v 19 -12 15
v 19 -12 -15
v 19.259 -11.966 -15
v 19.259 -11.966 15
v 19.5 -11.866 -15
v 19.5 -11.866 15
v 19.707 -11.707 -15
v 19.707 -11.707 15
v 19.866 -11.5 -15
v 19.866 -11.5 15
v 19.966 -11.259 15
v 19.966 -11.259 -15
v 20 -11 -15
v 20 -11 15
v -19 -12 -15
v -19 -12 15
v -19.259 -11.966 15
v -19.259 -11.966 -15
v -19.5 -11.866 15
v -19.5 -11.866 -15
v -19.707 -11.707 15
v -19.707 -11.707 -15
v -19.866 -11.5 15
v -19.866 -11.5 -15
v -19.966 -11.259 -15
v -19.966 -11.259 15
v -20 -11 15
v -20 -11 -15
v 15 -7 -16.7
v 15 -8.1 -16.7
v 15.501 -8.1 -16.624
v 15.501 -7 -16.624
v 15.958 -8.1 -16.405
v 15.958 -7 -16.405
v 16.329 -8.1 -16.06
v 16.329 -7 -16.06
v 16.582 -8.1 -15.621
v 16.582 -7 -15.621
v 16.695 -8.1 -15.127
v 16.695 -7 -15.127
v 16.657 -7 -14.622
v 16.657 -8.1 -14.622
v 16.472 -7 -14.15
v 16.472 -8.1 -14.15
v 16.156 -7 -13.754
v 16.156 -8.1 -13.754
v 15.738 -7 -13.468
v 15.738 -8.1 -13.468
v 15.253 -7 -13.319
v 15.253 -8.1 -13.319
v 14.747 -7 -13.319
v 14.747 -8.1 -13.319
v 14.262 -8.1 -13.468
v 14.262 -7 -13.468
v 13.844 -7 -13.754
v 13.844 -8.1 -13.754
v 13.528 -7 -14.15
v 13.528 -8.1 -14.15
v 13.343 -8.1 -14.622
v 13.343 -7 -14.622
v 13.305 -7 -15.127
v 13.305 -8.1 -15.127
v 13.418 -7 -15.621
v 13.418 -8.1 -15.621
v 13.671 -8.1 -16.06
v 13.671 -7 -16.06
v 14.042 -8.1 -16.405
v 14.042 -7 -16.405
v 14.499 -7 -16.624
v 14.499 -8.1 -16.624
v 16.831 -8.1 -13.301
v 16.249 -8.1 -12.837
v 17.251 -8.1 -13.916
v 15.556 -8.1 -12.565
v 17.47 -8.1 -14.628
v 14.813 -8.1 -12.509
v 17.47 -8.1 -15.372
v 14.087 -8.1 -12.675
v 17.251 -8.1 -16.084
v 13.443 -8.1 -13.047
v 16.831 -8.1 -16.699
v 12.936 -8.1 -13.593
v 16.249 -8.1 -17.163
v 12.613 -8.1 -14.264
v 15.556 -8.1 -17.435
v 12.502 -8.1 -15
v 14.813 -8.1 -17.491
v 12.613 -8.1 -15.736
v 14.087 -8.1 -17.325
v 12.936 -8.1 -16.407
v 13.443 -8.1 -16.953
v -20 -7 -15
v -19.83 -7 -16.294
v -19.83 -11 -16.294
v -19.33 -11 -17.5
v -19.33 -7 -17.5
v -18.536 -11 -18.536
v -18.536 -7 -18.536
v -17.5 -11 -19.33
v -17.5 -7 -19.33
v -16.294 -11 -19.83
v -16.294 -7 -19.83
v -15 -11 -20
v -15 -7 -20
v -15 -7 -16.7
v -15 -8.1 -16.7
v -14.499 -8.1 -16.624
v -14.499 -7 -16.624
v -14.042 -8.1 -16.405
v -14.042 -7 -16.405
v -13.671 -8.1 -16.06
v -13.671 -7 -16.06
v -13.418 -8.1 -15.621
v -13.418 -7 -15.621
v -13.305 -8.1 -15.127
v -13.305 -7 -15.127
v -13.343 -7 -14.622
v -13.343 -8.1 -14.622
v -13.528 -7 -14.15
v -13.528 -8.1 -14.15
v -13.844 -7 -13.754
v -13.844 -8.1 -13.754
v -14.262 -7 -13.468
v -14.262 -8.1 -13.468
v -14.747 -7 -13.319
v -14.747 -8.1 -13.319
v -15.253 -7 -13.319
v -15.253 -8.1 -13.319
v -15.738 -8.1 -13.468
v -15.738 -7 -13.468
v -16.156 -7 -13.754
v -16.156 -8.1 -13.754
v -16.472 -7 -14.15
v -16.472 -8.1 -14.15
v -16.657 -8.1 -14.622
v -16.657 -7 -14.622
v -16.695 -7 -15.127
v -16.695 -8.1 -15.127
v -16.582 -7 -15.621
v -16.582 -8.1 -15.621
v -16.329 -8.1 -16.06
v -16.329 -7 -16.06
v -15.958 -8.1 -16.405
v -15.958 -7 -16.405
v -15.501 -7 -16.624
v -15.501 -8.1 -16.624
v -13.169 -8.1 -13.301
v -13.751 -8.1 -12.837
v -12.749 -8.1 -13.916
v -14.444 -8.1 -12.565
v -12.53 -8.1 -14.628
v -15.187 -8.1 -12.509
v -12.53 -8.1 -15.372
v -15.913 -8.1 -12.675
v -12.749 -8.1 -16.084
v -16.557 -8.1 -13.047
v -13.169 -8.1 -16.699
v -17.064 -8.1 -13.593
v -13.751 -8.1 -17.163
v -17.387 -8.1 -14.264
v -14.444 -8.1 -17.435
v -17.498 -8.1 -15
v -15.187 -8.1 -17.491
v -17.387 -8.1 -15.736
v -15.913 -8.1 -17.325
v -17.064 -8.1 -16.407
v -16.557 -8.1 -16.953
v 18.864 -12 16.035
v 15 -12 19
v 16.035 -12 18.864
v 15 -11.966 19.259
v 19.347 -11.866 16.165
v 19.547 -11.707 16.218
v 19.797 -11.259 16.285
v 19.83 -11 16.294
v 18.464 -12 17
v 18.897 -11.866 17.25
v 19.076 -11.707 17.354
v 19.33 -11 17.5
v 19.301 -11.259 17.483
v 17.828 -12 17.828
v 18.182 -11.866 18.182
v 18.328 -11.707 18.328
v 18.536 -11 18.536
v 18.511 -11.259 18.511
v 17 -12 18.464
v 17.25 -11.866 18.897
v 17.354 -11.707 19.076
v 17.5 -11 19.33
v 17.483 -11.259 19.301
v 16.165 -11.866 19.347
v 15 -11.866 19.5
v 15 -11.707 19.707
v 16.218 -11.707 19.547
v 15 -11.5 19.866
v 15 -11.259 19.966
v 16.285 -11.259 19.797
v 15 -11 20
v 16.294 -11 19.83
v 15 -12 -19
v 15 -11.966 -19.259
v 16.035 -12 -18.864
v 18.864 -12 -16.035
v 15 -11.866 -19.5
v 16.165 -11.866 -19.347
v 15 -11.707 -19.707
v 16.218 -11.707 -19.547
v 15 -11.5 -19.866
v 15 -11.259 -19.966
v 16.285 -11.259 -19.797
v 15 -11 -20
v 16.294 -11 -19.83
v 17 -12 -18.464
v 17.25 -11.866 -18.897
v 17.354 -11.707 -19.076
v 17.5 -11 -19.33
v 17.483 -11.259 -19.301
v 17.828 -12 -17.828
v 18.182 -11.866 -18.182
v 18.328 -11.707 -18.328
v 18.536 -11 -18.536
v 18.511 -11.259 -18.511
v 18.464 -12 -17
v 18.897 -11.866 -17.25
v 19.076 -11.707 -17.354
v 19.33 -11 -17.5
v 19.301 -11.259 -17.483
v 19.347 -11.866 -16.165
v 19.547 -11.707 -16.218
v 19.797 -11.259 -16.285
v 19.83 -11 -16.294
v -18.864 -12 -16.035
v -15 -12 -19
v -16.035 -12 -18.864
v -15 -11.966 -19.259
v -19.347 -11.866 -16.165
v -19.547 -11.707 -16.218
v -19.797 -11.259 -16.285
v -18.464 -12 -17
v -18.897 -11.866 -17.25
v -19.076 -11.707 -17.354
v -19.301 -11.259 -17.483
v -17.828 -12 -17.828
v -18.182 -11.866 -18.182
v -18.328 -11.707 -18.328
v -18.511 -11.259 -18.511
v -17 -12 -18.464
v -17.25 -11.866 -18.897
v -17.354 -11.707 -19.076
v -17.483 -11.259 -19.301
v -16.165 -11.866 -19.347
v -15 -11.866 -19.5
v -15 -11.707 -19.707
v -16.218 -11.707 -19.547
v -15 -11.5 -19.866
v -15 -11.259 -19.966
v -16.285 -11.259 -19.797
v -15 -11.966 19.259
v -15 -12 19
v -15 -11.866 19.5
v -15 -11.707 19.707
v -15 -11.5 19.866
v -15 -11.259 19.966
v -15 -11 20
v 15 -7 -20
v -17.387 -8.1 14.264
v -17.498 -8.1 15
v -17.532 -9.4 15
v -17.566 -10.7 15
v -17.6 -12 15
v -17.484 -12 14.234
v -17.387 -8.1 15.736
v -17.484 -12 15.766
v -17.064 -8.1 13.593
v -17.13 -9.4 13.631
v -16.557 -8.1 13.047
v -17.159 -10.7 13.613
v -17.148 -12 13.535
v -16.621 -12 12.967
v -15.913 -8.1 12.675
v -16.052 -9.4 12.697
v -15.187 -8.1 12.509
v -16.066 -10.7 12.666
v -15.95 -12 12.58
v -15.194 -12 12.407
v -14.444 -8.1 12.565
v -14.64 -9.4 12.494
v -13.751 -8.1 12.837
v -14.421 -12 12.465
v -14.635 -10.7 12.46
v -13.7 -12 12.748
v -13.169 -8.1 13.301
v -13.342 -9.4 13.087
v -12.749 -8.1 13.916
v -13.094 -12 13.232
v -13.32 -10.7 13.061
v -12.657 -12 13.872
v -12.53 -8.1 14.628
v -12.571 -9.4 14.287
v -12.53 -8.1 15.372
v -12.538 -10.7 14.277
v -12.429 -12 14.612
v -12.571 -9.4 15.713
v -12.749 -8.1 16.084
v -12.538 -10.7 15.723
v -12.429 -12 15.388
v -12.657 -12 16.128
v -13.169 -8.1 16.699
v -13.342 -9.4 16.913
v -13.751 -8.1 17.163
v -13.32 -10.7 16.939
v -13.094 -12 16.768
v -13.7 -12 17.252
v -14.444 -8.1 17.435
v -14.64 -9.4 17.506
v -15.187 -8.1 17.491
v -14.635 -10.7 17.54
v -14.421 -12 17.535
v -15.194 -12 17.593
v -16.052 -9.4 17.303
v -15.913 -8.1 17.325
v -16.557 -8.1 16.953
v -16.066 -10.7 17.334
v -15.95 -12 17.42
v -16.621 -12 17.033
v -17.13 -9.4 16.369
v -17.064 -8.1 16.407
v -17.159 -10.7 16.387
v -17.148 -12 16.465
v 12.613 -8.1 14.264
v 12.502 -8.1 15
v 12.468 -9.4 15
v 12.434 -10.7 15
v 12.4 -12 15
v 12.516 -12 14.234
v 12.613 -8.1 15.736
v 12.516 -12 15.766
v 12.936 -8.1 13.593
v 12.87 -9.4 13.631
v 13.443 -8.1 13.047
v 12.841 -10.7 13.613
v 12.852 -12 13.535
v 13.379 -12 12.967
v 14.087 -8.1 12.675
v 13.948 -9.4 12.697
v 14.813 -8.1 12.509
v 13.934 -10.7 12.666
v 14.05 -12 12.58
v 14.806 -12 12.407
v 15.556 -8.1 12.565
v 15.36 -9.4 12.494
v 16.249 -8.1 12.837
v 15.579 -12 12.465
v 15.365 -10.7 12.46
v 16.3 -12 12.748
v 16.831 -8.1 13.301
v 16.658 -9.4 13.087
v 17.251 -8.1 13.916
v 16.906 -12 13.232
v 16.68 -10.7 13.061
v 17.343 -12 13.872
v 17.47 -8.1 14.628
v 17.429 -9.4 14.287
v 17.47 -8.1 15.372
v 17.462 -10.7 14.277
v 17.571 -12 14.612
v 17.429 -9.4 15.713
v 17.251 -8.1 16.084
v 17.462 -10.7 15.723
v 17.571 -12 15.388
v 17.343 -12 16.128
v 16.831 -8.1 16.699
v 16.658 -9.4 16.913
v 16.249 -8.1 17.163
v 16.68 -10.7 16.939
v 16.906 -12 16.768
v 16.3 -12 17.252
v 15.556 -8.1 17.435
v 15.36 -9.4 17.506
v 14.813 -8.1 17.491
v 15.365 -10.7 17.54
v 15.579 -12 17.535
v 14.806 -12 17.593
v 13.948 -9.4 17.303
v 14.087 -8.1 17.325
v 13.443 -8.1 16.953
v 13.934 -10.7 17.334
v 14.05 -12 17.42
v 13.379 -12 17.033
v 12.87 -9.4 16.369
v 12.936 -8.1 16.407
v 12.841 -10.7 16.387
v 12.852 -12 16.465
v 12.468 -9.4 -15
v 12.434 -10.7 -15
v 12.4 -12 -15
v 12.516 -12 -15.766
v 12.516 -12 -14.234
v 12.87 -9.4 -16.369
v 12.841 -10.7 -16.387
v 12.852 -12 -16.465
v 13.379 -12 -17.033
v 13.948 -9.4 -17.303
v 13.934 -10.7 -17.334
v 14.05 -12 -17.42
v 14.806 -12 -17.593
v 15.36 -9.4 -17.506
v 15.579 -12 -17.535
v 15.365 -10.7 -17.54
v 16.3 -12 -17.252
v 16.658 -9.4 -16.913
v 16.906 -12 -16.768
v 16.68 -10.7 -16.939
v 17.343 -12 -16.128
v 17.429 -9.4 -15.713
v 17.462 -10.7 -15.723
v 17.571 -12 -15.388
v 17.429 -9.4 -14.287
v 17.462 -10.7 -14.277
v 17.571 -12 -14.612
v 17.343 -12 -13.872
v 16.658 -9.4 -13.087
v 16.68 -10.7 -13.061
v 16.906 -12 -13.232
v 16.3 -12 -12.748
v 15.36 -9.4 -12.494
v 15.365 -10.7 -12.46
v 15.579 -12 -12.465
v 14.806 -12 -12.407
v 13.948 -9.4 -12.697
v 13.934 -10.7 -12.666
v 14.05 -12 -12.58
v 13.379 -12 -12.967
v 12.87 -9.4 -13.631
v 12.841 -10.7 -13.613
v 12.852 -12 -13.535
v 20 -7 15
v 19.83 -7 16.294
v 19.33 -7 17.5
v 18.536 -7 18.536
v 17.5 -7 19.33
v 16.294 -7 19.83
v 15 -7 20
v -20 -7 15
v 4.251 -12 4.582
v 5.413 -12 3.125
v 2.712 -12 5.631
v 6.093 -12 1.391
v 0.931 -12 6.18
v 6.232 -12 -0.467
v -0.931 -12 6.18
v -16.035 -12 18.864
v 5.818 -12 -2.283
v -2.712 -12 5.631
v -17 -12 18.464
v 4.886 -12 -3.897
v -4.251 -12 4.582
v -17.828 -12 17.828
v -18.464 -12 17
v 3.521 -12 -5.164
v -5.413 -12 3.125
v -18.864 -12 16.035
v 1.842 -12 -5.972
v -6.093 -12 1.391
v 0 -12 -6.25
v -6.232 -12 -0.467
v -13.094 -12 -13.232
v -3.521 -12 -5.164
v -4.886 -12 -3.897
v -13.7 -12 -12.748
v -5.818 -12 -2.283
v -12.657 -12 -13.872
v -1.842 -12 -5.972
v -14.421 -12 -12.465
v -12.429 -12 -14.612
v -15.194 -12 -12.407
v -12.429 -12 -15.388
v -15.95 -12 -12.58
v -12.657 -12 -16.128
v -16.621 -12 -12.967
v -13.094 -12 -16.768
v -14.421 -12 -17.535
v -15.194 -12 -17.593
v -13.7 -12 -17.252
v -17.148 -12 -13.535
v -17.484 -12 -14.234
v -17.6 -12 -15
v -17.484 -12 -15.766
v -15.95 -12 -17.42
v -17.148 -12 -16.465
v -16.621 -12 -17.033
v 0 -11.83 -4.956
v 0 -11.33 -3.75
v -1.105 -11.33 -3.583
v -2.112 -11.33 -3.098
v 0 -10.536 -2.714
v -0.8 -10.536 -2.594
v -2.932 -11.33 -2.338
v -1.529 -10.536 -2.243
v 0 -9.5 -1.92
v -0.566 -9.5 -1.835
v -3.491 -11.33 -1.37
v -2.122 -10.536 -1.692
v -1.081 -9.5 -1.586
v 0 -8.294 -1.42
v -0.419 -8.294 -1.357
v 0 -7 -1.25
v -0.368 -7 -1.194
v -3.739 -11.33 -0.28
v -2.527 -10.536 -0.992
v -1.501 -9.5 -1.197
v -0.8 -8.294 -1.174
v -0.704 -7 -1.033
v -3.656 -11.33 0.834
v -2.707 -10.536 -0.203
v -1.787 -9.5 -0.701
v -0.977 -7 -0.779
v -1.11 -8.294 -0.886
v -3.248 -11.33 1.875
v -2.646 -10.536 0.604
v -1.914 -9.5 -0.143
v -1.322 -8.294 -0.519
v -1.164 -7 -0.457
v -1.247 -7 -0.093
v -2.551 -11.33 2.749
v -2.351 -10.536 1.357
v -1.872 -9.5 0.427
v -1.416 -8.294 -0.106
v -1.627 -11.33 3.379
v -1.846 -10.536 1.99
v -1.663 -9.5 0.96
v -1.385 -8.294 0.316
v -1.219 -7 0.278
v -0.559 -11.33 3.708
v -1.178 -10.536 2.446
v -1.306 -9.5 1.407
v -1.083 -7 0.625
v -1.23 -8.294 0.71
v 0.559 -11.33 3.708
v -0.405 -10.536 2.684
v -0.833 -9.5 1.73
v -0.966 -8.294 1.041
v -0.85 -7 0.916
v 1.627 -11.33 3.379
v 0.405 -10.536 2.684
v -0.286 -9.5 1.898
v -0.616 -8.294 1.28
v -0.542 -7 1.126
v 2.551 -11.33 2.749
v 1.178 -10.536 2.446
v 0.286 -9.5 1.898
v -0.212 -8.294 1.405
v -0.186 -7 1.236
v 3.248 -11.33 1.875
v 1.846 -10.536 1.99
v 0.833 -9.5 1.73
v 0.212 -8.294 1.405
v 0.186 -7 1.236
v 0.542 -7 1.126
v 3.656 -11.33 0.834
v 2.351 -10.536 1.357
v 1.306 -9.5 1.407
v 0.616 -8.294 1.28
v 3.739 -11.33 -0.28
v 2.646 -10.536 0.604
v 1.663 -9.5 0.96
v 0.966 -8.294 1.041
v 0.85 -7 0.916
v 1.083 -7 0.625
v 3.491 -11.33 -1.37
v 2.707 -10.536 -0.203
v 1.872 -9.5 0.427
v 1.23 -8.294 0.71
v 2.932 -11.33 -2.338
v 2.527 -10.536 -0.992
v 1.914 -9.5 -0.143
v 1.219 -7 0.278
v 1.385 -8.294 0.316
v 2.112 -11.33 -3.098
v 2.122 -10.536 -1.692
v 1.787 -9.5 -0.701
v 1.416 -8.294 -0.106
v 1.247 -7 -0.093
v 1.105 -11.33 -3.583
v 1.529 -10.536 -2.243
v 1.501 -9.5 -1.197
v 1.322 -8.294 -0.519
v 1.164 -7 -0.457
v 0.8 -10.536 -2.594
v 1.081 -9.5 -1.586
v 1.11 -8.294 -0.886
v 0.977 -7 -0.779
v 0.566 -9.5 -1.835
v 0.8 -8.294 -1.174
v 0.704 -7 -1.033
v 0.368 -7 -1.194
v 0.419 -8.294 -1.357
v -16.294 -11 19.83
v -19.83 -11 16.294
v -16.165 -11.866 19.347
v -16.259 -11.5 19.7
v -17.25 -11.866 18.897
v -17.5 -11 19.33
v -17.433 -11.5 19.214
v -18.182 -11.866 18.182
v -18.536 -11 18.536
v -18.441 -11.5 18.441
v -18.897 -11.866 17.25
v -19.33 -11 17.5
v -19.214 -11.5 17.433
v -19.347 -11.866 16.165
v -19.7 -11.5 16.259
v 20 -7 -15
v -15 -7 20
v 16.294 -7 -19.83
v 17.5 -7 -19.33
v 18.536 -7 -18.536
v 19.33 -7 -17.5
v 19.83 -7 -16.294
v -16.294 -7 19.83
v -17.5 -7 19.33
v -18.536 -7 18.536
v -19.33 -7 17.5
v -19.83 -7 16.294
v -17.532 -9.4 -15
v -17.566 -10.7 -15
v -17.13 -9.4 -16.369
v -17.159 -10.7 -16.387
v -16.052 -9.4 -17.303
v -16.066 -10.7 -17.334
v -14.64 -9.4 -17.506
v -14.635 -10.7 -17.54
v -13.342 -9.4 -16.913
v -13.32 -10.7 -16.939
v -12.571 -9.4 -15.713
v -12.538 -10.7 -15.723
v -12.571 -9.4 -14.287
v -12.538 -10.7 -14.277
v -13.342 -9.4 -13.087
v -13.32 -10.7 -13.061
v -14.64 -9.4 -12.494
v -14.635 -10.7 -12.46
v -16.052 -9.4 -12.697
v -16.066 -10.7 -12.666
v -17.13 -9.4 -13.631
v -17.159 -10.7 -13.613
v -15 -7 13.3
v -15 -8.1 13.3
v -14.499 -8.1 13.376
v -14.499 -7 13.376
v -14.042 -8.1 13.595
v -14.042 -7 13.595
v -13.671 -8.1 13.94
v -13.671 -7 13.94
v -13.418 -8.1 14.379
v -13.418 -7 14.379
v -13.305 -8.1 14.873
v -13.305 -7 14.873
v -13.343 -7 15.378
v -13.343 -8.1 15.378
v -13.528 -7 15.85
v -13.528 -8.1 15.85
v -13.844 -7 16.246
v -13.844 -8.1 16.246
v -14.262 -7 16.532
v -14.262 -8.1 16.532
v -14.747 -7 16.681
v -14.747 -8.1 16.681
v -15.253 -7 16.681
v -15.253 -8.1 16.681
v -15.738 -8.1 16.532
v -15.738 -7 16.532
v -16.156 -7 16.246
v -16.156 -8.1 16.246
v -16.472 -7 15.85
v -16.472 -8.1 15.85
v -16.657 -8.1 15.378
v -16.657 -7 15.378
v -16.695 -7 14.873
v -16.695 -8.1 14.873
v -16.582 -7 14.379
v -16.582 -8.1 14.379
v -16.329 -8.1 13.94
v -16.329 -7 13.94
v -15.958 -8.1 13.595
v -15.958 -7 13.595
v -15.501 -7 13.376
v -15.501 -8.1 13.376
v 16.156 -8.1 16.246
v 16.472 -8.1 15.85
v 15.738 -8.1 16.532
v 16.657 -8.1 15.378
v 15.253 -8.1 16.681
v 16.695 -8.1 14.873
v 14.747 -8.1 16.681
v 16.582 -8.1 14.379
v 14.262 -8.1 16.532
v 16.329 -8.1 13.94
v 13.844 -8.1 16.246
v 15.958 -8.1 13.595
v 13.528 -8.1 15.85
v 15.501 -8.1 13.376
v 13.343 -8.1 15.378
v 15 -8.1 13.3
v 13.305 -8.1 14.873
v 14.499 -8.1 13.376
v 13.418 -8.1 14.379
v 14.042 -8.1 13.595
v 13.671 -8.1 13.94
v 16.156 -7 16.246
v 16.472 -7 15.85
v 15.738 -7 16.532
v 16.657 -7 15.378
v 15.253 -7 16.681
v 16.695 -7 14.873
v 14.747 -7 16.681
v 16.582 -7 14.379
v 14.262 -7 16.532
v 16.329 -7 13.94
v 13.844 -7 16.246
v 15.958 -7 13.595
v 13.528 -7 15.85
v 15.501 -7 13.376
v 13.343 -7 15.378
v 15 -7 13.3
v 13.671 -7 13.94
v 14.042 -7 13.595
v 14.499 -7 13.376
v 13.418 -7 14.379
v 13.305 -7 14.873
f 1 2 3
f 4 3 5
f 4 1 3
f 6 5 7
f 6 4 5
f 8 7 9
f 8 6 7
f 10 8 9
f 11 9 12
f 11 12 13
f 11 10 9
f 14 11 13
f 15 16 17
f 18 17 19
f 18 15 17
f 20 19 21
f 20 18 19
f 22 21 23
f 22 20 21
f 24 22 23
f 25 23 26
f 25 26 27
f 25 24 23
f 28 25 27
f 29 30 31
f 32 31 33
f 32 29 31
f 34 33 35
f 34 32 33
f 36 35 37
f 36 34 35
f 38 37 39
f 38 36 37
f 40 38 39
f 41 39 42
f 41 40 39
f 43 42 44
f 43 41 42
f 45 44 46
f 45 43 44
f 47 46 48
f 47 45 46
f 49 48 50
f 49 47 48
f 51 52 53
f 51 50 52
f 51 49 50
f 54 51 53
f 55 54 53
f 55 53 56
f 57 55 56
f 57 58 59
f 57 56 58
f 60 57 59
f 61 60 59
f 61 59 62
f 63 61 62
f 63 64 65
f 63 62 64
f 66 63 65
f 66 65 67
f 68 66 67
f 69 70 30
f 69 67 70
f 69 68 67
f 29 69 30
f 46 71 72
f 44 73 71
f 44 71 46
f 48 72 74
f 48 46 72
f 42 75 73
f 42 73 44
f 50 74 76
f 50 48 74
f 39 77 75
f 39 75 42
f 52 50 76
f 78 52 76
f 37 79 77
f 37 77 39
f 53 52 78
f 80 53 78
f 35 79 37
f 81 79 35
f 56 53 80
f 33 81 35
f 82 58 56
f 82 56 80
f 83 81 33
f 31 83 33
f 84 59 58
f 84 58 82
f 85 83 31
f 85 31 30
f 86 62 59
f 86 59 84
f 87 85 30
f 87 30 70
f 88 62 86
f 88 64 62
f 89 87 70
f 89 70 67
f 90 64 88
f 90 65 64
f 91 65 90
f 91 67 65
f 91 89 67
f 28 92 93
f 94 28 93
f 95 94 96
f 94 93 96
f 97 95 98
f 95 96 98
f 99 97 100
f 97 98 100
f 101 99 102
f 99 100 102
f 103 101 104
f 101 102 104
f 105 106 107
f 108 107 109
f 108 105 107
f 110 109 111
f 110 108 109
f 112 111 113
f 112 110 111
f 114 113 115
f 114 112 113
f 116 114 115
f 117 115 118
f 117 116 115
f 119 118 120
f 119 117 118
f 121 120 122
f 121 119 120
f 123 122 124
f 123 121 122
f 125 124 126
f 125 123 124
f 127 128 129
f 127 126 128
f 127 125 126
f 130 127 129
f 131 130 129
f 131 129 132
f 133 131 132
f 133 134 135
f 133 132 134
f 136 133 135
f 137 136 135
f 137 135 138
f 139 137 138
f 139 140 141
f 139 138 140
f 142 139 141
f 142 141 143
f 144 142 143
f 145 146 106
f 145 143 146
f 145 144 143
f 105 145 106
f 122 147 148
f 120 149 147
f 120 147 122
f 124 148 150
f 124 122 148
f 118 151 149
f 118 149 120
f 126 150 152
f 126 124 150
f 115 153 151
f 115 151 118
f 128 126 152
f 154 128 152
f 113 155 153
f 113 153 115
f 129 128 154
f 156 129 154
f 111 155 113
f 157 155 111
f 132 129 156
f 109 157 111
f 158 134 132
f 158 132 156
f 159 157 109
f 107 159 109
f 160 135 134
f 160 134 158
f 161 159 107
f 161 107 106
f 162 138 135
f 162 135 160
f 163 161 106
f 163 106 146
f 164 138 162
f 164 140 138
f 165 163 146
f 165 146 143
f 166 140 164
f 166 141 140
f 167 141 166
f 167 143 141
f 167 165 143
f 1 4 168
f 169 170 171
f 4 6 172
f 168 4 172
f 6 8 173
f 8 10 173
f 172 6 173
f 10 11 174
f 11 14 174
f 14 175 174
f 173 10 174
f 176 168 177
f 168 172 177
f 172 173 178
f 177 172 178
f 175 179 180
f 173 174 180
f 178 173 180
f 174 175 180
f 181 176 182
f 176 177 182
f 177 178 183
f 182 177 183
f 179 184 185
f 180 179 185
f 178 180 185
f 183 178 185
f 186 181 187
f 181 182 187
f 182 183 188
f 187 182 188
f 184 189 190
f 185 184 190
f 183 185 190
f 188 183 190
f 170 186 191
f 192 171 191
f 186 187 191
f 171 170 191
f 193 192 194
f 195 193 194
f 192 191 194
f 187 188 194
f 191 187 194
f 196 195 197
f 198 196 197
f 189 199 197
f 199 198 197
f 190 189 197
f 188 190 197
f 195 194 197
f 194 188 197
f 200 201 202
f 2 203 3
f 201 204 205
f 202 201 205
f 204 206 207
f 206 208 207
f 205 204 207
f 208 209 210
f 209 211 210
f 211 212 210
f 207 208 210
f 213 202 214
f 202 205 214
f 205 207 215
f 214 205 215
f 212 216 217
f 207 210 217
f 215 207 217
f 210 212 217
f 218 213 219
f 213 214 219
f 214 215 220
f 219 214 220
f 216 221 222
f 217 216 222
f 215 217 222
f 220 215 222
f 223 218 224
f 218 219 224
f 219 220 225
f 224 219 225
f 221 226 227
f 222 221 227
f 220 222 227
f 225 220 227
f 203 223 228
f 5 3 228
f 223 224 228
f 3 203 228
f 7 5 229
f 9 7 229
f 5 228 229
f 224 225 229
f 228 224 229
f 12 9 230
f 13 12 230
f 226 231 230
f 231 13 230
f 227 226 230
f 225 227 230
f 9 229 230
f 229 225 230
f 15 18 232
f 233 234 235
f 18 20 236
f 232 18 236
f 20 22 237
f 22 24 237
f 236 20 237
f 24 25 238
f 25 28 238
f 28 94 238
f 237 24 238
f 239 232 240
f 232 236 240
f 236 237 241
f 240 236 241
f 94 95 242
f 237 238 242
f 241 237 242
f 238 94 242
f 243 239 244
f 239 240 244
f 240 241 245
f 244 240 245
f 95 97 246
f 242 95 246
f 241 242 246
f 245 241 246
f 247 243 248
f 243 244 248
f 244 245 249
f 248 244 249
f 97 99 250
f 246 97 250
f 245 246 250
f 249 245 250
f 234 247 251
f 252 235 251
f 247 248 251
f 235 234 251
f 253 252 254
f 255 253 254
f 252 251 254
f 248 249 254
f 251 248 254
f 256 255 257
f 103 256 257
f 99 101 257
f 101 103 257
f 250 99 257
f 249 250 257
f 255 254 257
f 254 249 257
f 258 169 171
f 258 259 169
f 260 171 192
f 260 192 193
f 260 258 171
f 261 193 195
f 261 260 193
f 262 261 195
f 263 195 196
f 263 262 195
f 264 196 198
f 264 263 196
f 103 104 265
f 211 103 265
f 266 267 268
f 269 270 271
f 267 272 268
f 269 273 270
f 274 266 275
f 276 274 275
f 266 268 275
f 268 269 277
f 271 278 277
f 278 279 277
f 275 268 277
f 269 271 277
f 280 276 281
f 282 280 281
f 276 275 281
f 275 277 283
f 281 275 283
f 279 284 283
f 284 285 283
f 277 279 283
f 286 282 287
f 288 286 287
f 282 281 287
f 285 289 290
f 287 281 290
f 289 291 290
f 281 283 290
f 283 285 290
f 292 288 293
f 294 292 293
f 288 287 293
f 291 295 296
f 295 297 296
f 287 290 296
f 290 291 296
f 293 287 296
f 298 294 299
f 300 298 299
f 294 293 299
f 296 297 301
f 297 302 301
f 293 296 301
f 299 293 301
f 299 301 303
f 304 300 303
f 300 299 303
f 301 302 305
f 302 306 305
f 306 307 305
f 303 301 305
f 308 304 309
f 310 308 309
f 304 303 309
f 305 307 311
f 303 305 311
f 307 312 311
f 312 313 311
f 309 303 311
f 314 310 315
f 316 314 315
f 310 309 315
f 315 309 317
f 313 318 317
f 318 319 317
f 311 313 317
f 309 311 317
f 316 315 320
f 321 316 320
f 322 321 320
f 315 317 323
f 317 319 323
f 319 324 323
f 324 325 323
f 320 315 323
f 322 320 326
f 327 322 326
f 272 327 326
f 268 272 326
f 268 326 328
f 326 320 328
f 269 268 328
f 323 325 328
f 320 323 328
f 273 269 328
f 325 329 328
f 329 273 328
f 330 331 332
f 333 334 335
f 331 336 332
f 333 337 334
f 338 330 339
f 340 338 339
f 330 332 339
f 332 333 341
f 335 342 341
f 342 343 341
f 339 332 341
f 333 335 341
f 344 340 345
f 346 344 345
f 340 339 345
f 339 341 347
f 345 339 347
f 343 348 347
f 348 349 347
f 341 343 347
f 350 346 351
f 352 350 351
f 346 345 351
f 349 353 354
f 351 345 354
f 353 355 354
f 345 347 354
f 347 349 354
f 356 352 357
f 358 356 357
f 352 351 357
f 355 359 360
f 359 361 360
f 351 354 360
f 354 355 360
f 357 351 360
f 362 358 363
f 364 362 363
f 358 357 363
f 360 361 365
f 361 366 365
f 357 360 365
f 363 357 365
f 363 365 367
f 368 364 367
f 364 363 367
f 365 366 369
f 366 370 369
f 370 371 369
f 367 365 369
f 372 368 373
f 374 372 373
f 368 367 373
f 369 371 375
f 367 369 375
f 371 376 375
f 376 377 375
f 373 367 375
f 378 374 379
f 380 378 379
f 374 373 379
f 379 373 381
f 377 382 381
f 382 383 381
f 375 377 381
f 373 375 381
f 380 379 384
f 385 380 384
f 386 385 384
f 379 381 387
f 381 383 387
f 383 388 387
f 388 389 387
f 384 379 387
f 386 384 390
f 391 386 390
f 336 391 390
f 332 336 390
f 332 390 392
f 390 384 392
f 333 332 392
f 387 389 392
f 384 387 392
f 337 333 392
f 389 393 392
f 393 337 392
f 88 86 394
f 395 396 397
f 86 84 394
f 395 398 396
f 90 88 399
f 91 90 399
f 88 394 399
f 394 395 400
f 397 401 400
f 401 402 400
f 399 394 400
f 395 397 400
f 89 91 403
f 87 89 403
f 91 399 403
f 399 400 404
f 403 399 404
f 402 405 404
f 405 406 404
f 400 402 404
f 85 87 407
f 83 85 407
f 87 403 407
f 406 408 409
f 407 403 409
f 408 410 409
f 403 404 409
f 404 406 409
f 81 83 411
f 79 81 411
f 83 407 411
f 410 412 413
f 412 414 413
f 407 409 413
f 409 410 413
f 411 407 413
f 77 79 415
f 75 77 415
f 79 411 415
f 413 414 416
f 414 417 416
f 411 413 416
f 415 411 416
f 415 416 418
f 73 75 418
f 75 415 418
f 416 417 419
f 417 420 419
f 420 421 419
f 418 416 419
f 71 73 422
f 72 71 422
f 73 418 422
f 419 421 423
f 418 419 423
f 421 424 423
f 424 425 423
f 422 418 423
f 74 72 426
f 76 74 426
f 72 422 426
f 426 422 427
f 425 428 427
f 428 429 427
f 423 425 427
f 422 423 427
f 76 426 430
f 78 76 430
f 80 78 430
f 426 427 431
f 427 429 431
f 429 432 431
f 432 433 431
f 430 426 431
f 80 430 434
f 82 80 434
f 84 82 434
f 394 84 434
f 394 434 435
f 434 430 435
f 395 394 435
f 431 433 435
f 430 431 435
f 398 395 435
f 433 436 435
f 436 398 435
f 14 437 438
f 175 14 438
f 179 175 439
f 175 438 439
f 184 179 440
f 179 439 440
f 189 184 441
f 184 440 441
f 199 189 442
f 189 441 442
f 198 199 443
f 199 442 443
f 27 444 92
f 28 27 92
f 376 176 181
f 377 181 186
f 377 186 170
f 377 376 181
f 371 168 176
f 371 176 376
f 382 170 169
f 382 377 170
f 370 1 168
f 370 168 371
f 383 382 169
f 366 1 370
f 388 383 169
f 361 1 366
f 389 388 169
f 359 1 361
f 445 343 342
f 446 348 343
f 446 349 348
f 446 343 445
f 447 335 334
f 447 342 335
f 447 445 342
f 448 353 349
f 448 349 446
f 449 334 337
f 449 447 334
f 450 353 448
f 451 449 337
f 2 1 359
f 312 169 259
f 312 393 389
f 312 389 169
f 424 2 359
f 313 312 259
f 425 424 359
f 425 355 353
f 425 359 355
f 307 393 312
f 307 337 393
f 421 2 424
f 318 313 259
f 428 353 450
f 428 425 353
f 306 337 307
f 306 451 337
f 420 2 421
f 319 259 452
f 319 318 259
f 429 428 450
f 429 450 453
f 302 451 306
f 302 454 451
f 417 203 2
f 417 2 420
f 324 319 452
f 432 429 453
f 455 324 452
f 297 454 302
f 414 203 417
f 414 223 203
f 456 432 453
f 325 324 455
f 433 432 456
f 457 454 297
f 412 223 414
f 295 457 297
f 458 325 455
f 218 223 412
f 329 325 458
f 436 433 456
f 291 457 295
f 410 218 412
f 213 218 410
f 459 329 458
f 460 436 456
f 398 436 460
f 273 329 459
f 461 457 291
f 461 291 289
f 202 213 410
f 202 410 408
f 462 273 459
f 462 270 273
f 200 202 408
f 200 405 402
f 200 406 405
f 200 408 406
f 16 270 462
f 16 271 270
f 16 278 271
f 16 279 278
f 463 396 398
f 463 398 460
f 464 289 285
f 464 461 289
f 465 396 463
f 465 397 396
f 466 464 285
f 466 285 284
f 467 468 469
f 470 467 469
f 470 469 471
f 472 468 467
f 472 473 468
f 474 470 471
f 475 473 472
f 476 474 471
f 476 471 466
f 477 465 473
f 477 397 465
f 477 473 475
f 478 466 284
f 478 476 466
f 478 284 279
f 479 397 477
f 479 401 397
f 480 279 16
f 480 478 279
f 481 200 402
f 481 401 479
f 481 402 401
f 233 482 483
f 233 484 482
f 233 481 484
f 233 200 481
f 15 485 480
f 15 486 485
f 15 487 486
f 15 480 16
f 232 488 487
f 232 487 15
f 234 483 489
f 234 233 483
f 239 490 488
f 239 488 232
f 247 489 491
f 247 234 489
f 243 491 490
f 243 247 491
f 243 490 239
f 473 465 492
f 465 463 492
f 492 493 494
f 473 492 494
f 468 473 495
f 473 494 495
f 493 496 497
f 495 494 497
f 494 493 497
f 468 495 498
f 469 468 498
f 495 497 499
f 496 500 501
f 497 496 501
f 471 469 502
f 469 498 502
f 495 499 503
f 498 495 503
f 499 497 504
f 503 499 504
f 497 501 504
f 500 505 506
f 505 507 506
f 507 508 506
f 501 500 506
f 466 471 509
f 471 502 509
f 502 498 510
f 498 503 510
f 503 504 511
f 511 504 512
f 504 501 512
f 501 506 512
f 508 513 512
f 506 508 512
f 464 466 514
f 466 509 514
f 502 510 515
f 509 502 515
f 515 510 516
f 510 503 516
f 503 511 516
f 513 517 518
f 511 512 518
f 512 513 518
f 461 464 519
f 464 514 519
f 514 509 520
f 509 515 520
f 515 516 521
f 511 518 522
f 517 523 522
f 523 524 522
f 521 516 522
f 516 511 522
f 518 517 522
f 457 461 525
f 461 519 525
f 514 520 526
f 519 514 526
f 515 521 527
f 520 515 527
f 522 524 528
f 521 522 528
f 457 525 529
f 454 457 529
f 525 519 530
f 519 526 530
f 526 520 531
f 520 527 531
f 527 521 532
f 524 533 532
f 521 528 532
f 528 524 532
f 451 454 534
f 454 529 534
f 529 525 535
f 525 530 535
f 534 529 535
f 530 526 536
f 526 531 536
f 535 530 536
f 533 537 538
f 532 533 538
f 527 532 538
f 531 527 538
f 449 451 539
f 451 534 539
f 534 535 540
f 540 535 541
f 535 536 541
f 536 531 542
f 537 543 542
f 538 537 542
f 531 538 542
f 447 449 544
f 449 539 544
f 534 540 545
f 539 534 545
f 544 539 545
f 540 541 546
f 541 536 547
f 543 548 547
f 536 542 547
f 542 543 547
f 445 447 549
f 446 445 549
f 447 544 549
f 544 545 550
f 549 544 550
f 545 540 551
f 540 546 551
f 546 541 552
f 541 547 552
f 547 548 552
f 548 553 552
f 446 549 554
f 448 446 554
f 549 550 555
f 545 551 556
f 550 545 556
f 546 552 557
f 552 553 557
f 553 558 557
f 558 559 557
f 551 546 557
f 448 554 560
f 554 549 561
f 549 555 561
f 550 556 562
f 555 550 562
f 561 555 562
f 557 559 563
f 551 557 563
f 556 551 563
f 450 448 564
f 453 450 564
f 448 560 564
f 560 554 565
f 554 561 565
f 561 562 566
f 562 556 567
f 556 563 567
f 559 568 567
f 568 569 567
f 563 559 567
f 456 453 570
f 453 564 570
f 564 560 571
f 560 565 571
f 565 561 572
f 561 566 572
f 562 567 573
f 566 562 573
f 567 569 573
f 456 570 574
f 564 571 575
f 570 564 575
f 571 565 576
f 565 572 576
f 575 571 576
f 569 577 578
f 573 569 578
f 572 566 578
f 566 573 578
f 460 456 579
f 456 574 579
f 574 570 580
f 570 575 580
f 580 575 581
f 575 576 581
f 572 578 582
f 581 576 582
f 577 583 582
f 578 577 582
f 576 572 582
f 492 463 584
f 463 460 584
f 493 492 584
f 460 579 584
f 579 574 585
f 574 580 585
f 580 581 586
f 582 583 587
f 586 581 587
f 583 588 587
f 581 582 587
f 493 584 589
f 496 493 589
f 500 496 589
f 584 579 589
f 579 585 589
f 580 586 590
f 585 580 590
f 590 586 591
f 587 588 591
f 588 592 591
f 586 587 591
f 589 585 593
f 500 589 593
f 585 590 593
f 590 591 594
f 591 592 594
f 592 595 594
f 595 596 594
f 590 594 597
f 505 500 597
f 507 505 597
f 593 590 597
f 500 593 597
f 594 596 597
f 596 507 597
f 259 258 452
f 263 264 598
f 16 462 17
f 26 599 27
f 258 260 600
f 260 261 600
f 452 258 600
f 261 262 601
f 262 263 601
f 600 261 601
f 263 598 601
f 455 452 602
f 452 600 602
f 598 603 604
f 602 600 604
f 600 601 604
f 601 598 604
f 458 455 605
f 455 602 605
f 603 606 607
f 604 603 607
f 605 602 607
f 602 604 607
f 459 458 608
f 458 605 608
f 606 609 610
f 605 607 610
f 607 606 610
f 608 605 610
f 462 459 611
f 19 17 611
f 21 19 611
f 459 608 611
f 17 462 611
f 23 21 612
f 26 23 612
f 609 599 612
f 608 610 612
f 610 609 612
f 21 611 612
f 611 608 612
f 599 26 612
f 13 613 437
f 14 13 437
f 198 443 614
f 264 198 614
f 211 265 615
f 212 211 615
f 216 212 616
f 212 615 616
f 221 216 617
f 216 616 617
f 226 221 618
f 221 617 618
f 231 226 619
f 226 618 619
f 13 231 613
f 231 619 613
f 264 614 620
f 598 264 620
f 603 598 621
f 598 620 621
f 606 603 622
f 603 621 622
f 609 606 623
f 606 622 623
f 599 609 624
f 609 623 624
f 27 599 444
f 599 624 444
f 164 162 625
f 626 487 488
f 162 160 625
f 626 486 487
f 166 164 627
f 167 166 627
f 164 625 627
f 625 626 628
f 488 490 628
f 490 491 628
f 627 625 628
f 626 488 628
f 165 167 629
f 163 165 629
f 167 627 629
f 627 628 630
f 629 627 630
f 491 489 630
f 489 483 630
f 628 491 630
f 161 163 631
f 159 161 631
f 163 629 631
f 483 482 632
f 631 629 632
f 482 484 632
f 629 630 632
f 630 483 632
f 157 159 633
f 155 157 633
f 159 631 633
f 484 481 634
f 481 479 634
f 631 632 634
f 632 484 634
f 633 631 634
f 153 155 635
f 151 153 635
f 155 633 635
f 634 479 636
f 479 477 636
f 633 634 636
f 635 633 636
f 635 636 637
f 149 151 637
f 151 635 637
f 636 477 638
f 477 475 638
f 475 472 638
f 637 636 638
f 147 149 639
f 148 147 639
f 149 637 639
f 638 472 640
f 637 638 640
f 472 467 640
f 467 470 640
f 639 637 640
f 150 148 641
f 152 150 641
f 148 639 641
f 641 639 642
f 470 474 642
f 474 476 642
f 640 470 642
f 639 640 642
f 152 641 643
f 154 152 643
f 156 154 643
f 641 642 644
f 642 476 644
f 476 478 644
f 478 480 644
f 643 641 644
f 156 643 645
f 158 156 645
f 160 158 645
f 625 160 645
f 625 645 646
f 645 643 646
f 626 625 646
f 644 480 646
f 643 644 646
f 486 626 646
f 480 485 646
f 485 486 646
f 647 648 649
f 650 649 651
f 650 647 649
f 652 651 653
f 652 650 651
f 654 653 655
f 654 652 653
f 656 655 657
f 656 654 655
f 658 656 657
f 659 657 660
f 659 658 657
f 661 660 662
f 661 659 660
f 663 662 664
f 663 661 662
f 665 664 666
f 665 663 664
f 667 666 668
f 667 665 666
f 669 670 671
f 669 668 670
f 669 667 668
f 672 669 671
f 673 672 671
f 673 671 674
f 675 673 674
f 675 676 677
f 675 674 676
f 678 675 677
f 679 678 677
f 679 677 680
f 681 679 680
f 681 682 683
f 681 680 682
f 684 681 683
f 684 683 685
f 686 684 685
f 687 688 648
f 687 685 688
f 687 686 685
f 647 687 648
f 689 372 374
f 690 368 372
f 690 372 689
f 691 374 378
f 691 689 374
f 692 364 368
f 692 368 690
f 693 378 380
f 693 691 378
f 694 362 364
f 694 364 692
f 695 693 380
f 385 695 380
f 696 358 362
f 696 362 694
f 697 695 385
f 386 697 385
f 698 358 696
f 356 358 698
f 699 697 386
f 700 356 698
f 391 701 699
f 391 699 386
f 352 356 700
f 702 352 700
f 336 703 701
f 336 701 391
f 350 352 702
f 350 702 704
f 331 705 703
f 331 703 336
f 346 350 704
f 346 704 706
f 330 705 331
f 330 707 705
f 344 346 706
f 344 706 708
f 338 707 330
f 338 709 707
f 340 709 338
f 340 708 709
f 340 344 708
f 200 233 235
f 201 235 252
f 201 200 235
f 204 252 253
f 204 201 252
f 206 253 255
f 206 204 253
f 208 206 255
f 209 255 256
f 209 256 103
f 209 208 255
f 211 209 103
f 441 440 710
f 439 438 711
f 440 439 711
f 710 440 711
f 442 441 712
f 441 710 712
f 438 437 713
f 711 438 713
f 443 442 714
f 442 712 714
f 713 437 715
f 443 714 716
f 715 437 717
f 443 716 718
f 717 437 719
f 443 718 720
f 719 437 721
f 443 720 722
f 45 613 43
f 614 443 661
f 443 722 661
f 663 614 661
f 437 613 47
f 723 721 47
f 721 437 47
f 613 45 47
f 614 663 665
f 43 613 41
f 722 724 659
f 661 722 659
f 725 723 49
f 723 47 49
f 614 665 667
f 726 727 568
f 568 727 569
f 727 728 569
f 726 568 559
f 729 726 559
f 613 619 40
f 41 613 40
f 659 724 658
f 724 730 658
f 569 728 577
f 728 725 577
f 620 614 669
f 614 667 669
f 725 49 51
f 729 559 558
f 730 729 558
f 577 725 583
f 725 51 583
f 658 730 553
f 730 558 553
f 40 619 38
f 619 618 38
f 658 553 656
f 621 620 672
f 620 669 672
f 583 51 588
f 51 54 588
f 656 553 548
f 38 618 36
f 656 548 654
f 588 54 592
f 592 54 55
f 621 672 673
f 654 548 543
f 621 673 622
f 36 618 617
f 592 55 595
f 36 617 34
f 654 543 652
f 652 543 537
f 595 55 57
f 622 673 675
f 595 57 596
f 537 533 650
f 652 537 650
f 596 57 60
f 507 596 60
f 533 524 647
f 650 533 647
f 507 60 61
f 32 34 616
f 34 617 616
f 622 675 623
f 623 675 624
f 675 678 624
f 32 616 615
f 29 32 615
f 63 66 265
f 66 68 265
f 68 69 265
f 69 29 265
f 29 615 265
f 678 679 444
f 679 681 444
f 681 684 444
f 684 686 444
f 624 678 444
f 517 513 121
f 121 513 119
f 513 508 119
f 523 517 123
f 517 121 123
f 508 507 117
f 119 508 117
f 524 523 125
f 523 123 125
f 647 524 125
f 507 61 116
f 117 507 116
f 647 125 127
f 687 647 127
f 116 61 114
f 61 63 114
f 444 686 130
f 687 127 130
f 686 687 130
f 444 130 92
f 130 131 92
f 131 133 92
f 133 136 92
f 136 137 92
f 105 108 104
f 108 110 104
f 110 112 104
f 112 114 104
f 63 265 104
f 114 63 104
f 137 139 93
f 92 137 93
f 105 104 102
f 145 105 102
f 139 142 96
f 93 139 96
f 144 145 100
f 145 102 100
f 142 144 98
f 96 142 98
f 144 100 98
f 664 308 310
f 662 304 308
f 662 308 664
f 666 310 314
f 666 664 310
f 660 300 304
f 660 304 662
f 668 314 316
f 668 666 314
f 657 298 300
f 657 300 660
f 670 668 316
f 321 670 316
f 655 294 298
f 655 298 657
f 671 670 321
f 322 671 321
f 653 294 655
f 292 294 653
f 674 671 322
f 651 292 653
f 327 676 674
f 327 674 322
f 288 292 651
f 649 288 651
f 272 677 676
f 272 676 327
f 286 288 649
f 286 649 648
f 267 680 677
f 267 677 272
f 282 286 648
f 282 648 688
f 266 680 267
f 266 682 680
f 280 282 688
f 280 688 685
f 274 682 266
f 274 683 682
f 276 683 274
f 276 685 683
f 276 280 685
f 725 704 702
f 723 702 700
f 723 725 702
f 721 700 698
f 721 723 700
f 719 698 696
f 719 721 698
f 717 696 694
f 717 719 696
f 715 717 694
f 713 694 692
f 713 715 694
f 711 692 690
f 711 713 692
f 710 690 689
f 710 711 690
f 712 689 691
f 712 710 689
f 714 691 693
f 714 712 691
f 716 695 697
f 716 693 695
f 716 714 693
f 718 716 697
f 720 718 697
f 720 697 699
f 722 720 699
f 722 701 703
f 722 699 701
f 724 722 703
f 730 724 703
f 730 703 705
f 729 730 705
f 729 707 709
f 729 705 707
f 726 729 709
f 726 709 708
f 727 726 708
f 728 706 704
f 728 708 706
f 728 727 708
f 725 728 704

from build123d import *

# Parameters (mm, degrees)
BOSS_EXTRUDE1_DEPTH          = 5
SKETCH1_3_R                  = 1.7
SKETCH1_3_R_2                = 1.25
CUT_EXTRUDE3_DEPTH           = 29.722813233
CUT_EXTRUDE4_START           = 5
SKETCH1_4_R                  = 2.6
CUT_EXTRUDE4_DEPTH           = 3.9
CUT_EXTRUDE4_DRAFT           = -1.5
CUT_EXTRUDE4_PROFILE_2_DEPTH = 3.9
CUT_EXTRUDE4_PROFILE_2_DRAFT = -1.5
CUT_EXTRUDE4_PROFILE_3_DEPTH = 3.9
CUT_EXTRUDE4_PROFILE_3_DRAFT = -1.5
CUT_EXTRUDE4_PROFILE_4_DEPTH = 3.9
CUT_EXTRUDE4_PROFILE_4_DRAFT = -1.5
FILLET1_R                    = 5
FILLET2_R                    = 1


with BuildPart() as part:
    # Sketch1 → Boss-Extrude1 (new body)
    with BuildSketch(Plane(origin=(0, -7, 0), x_dir=(-1, 0, 0), z_dir=(0, -1, 0))):
        with BuildLine():
            Line((15, 20), (-15, 20))
            ThreePointArc((-15, 20), (-18.535533906, 18.535533906), (-20, 15))
            Line((-20, 15), (-20, -15))
            ThreePointArc((-20, -15), (-18.535533906, -18.535533906), (-15, -20))
            Line((-15, -20), (15, -20))
            ThreePointArc((15, -20), (18.535533906, -18.535533906), (20, -15))
            Line((20, -15), (20, 15))
            ThreePointArc((20, 15), (18.535533906, 18.535533906), (15, 20))
        make_face()
    extrude(amount=BOSS_EXTRUDE1_DEPTH)

    # Sketch1<3> → Cut-Extrude3 (cut, through all)
    with BuildSketch(Plane(origin=(0, -7, 0), x_dir=(-1, 0, 0), z_dir=(0, -1, 0))):
        with Locations(Location((-15, 15, 0), (0, 0, 90))):
            Circle(SKETCH1_3_R)
        with Locations(Location((15, 15, 0), (0, 0, 90))):
            Circle(SKETCH1_3_R)
        with Locations(Location((-15, -15, 0), (0, 0, 90))):
            Circle(SKETCH1_3_R)
        with Locations(Location((15, -15, 0), (0, 0, 90))):
            Circle(SKETCH1_3_R)
        with Locations(Location((0, 0, 0), (0, 0, 90))):
            Circle(SKETCH1_3_R_2)
    extrude(amount=CUT_EXTRUDE3_DEPTH, mode=Mode.SUBTRACT)


with BuildPart() as cut_extrude4_tool:
    # Sketch1<4> → Cut-Extrude4 (with draft: the straight prism first)
    with BuildSketch(Plane(origin=(0, -7, 0), x_dir=(-1, 0, 0), z_dir=(0, -1, 0)).offset(CUT_EXTRUDE4_START)):
        with Locations((15, -15)):
            Circle(SKETCH1_4_R)
    extrude(amount=-CUT_EXTRUDE4_DEPTH)
    # Cut-Extrude4: the draft: its side faces are tilted about the plane it starts from
    cut_extrude4_sides = [cut_extrude4_tool.faces().sort_by_distance(p)[0] for p in [
        (-12.4, -10.05, 15),
    ]]
    draft(cut_extrude4_sides, Plane(origin=(0, -7, 0), x_dir=(-1, 0, 0), z_dir=(0, -1, 0)).offset(CUT_EXTRUDE4_START), CUT_EXTRUDE4_DRAFT)


with BuildPart() as part_1:
    add(part.part)

    # Cut-Extrude4: cut by cut_extrude4_tool
    add(cut_extrude4_tool.part, mode=Mode.SUBTRACT)


with BuildPart() as cut_extrude4_profile_2_tool:
    # Sketch1<4> → Cut-Extrude4 profile 2 (with draft: the straight prism first)
    with BuildSketch(Plane(origin=(0, -7, 0), x_dir=(-1, 0, 0), z_dir=(0, -1, 0)).offset(CUT_EXTRUDE4_START)):
        with Locations((-15, -15)):
            Circle(SKETCH1_4_R)
    extrude(amount=-CUT_EXTRUDE4_PROFILE_2_DEPTH)
    # Cut-Extrude4 profile 2: the draft: its side faces are tilted about the plane it starts from
    cut_extrude4_profile_2_sides = [cut_extrude4_profile_2_tool.faces().sort_by_distance(p)[0] for p in [
        (17.6, -10.05, 15),
    ]]
    draft(cut_extrude4_profile_2_sides, Plane(origin=(0, -7, 0), x_dir=(-1, 0, 0), z_dir=(0, -1, 0)).offset(CUT_EXTRUDE4_START), CUT_EXTRUDE4_PROFILE_2_DRAFT)


with BuildPart() as part_2:
    add(part_1.part)

    # Cut-Extrude4 profile 2: cut by cut_extrude4_profile_2_tool
    add(cut_extrude4_profile_2_tool.part, mode=Mode.SUBTRACT)


with BuildPart() as cut_extrude4_profile_3_tool:
    # Sketch1<4> → Cut-Extrude4 profile 3 (with draft: the straight prism first)
    with BuildSketch(Plane(origin=(0, -7, 0), x_dir=(-1, 0, 0), z_dir=(0, -1, 0)).offset(CUT_EXTRUDE4_START)):
        with Locations((-15, 15)):
            Circle(SKETCH1_4_R)
    extrude(amount=-CUT_EXTRUDE4_PROFILE_3_DEPTH)
    # Cut-Extrude4 profile 3: the draft: its side faces are tilted about the plane it starts from
    cut_extrude4_profile_3_sides = [cut_extrude4_profile_3_tool.faces().sort_by_distance(p)[0] for p in [
        (17.6, -10.05, -15),
    ]]
    draft(cut_extrude4_profile_3_sides, Plane(origin=(0, -7, 0), x_dir=(-1, 0, 0), z_dir=(0, -1, 0)).offset(CUT_EXTRUDE4_START), CUT_EXTRUDE4_PROFILE_3_DRAFT)


with BuildPart() as part_3:
    add(part_2.part)

    # Cut-Extrude4 profile 3: cut by cut_extrude4_profile_3_tool
    add(cut_extrude4_profile_3_tool.part, mode=Mode.SUBTRACT)


with BuildPart() as cut_extrude4_profile_4_tool:
    # Sketch1<4> → Cut-Extrude4 profile 4 (with draft: the straight prism first)
    with BuildSketch(Plane(origin=(0, -7, 0), x_dir=(-1, 0, 0), z_dir=(0, -1, 0)).offset(CUT_EXTRUDE4_START)):
        with Locations((15, 15)):
            Circle(SKETCH1_4_R)
    extrude(amount=-CUT_EXTRUDE4_PROFILE_4_DEPTH)
    # Cut-Extrude4 profile 4: the draft: its side faces are tilted about the plane it starts from
    cut_extrude4_profile_4_sides = [cut_extrude4_profile_4_tool.faces().sort_by_distance(p)[0] for p in [
        (-12.4, -10.05, -15),
    ]]
    draft(cut_extrude4_profile_4_sides, Plane(origin=(0, -7, 0), x_dir=(-1, 0, 0), z_dir=(0, -1, 0)).offset(CUT_EXTRUDE4_START), CUT_EXTRUDE4_PROFILE_4_DRAFT)


with BuildPart() as part_4:
    add(part_3.part)

    # Cut-Extrude4 profile 4: cut by cut_extrude4_profile_4_tool
    add(cut_extrude4_profile_4_tool.part, mode=Mode.SUBTRACT)

    # Fillet1
    fillet1_edges = [part_4.edges().sort_by_distance(p)[0] for p in [
        (0, -12, 1.25),
    ]]
    fillet(fillet1_edges, radius=FILLET1_R - 0.0001)  # a hair under: the kernel refuses the full size

    # Fillet2
    fillet2_edges = [part_4.edges().sort_by_distance(p)[0] for p in [
        (-18.535533906, -12, 18.535533906),
        (-20, -12, 0),
        (-18.535533906, -12, -18.535533906),
        (0, -12, -20),
        (18.535533906, -12, -18.535533906),
        (20, -12, 0),
        (18.535533906, -12, 18.535533906),
        (0, -12, 20),
    ]]
    fillet(fillet2_edges, radius=FILLET2_R)


solid = part_4.part
